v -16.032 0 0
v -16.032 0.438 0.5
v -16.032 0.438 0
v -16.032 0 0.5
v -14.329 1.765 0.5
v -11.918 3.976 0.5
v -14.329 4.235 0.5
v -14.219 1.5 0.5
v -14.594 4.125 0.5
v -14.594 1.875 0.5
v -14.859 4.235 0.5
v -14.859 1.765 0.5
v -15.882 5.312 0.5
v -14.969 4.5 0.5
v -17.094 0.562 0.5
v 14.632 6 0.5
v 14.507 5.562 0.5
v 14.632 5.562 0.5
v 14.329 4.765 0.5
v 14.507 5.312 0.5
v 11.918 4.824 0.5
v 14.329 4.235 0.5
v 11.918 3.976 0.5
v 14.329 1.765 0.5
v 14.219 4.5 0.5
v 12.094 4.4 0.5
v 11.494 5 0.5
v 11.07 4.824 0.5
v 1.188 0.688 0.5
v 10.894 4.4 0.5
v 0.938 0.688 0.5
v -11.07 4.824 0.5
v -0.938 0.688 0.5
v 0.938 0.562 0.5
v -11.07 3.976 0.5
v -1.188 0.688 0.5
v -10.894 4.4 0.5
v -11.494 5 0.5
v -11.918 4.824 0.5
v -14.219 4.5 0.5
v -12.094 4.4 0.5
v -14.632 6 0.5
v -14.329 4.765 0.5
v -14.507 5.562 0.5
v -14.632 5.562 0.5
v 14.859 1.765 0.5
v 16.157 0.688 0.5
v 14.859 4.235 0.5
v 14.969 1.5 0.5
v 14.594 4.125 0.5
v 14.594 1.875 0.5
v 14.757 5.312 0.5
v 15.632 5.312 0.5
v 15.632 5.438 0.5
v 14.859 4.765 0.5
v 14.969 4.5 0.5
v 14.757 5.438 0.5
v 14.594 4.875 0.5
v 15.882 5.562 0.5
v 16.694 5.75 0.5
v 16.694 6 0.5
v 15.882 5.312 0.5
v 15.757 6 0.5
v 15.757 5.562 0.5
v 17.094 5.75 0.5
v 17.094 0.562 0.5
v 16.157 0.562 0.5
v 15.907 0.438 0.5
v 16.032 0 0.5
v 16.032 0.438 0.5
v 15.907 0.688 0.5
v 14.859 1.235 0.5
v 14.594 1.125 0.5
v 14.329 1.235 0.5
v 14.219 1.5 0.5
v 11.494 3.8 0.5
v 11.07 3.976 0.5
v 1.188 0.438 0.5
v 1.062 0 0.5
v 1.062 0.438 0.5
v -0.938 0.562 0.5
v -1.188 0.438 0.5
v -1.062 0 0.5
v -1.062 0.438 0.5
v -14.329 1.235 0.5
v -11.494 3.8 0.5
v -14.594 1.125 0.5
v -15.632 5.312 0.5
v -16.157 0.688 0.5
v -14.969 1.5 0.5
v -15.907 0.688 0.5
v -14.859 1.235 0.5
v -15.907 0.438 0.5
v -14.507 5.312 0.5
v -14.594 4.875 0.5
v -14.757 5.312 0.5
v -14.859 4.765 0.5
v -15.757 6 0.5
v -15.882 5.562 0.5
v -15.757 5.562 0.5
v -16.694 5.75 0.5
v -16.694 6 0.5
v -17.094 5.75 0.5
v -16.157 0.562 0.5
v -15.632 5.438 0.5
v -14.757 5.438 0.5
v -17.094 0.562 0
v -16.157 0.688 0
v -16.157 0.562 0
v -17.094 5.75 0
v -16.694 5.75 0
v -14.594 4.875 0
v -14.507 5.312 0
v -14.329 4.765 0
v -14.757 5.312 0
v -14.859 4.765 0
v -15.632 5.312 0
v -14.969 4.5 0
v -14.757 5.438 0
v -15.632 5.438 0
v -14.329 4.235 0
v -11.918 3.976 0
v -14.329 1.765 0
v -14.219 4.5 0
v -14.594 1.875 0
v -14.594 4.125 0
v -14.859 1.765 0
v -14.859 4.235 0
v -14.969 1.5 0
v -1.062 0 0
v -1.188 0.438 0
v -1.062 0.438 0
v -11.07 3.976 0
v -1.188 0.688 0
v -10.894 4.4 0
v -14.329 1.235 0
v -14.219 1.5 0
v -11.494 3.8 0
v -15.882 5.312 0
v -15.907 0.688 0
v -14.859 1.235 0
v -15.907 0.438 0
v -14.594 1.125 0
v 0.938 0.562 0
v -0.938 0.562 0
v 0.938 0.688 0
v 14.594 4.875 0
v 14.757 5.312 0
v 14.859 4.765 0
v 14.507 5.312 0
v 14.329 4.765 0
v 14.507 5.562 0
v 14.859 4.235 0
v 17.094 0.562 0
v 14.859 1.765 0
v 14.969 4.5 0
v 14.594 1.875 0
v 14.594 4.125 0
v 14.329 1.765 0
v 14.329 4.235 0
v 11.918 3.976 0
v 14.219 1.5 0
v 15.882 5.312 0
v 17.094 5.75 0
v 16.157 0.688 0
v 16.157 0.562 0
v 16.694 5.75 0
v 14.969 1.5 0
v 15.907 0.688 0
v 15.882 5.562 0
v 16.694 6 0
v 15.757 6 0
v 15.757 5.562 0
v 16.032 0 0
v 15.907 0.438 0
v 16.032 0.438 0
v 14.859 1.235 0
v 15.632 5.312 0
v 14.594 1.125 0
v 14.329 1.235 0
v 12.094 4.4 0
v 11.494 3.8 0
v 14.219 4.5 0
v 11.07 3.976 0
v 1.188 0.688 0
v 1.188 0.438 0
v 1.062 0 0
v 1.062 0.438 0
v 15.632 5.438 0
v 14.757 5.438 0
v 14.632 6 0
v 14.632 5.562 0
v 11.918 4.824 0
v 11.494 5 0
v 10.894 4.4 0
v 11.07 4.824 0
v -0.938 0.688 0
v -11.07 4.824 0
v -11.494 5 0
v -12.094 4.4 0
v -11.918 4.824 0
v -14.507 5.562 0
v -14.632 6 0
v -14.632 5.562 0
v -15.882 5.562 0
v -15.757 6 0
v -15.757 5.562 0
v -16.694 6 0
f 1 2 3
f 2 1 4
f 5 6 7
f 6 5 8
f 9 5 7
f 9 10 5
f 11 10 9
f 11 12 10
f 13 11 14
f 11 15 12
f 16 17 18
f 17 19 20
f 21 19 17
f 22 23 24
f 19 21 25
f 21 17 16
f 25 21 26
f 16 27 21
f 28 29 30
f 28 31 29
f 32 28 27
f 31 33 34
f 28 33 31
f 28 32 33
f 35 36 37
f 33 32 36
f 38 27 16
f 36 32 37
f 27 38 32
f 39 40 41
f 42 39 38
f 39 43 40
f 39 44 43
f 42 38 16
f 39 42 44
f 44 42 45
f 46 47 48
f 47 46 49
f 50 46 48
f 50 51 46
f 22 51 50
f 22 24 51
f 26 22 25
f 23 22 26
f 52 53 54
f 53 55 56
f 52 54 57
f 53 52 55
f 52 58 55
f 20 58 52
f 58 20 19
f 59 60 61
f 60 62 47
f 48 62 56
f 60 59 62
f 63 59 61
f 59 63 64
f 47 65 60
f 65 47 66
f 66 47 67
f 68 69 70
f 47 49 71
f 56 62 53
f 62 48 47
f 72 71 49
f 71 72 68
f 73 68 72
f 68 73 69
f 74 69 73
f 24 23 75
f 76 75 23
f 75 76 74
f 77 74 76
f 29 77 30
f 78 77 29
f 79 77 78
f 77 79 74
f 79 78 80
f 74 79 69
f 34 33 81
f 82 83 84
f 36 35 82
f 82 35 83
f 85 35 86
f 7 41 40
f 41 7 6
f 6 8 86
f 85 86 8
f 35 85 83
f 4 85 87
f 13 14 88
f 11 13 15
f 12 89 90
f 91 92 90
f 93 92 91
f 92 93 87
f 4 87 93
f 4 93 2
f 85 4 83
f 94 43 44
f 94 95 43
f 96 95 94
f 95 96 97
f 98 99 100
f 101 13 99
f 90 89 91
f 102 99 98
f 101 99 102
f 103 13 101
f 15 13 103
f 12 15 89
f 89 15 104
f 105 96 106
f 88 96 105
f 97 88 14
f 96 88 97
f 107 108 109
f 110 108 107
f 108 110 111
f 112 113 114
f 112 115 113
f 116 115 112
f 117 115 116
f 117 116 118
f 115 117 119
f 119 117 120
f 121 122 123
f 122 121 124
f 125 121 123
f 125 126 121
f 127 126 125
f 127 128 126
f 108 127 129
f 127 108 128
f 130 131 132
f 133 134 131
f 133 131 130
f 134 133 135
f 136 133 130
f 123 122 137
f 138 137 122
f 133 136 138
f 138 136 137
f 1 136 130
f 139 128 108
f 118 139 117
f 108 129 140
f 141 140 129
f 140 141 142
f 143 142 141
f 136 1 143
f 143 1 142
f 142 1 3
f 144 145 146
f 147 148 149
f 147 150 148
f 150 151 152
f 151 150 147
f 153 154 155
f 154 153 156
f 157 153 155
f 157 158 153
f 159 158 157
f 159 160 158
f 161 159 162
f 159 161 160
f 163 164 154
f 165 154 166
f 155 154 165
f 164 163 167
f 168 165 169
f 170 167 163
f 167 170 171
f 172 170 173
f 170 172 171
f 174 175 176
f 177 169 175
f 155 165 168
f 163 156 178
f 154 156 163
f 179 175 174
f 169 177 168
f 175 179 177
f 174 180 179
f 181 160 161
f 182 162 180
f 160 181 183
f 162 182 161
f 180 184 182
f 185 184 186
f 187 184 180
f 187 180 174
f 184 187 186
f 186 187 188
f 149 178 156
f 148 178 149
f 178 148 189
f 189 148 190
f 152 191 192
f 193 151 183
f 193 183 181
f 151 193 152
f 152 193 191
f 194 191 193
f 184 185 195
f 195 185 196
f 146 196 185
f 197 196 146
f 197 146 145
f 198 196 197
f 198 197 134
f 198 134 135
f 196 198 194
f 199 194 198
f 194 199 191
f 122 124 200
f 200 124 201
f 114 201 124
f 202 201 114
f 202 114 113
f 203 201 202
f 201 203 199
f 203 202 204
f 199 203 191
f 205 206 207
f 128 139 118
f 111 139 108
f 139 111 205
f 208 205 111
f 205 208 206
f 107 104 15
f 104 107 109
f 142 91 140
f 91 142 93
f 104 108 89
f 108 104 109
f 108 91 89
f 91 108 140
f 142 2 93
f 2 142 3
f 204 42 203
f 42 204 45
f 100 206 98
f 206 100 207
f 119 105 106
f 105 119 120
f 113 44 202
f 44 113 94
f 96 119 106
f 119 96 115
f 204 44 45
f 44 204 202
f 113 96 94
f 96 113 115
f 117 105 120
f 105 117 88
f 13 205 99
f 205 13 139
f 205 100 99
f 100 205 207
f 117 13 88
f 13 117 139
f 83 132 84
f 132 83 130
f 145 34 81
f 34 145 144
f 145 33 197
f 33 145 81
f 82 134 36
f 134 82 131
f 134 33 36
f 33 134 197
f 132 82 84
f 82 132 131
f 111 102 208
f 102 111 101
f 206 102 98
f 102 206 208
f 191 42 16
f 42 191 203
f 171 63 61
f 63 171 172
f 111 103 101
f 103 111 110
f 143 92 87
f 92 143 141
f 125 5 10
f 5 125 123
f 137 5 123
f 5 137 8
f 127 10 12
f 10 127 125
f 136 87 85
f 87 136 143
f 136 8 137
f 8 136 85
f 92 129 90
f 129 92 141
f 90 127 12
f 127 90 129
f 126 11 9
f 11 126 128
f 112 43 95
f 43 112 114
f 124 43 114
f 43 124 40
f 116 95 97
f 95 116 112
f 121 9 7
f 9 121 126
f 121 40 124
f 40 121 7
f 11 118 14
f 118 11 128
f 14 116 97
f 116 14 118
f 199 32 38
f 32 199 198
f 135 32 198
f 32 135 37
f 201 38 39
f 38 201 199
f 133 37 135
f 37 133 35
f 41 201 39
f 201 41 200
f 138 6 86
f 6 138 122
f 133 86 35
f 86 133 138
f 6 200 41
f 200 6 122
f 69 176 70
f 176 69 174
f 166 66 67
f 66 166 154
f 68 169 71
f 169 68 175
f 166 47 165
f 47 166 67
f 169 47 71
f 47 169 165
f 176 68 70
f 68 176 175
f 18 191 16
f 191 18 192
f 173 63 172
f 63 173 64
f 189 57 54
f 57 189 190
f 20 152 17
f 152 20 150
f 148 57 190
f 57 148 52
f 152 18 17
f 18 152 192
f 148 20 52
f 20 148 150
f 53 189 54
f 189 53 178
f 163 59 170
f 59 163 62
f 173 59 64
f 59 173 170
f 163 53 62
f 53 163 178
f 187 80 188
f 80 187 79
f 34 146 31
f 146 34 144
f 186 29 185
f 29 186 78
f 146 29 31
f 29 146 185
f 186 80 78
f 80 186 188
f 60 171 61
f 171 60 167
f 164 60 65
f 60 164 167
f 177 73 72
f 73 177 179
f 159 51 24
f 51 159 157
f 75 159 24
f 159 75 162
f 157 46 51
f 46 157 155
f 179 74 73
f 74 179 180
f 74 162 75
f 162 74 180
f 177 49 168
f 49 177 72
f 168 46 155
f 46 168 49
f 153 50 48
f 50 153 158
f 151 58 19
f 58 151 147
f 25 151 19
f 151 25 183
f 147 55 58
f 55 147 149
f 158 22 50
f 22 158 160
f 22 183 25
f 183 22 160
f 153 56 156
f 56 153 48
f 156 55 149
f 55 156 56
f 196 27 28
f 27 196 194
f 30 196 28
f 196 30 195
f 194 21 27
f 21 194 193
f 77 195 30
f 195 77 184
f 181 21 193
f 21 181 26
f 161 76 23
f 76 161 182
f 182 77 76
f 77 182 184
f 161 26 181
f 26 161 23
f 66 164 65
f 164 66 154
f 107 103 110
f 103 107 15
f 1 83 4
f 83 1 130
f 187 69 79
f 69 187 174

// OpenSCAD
// file: modus.scad
//Corner Joint - allows the sides of two parts to create inlayed corner. Aids with welding.
//need to verify module math is the same throughout all parts.

module cornerjoint(Z,L,H,EndGap,PadL,PadH,CJangle,CJcenter){
    //change so that H = Z of inlayed part (usually 0.5)
    //add center and angle in degrees option, orgin far side of cut out area

     if((CJangle==0)&&(CJcenter==0))
      {    
        translate([0,0,0])
        rotate([0,0,CJangle])
        difference(){
        cube([L,H+PadH,Z]);
        translate([EndGap,H,0])
        cube([PadL,PadH,Z]);
        translate([L-EndGap-PadL,H,0])
        cube([PadL,PadH,Z]);}
      }    
else if((CJangle==90)&&(CJcenter==0))
      {    
        translate([H+PadH,0,0])
        rotate([0,0,CJangle])
        difference(){
        cube([L,H+PadH,Z]);
        translate([EndGap,H,0])
        cube([PadL,PadH,Z]);
        translate([L-EndGap-PadL,H,0])
        cube([PadL,PadH,Z]);}
      }
else if((CJangle==180)&&(CJcenter==0))       
      {    
        translate([L,H+PadH,0])
        rotate([0,0,CJangle])
        difference(){
        cube([L,H+PadH,Z]);
        translate([EndGap,H,0])
        cube([PadL,PadH,Z]);
        translate([L-EndGap-PadL,H,0])
        cube([PadL,PadH,Z]);}
      }
else if((CJangle==270)&&(CJcenter==0))
      {    
        translate([0,L,0])
        rotate([0,0,CJangle])
        difference(){
        cube([L,H+PadH,Z]);
        translate([EndGap,H,0])
        cube([PadL,PadH,Z]);
        translate([L-EndGap-PadL,H,0])
        cube([PadL,PadH,Z]);}
      }  
      
//centered     
   
else if((CJangle==0)&&(CJcenter==1))
      {    
        translate([-L/2,0,0])
        rotate([0,0,CJangle])
        difference(){
        cube([L,H+PadH,Z]);
        translate([EndGap,H,0])
        cube([PadL,PadH,Z]);
        translate([L-EndGap-PadL,H,0])
        cube([PadL,PadH,Z]);}
      }  
else if((CJangle==90)&&(CJcenter==1))
      {    
        translate([0,-L/2,0])
        rotate([0,0,CJangle])
        difference(){
        cube([L,H+PadH,Z]);
        translate([EndGap,H,0])
        cube([PadL,PadH,Z]);
        translate([L-EndGap-PadL,H,0])
        cube([PadL,PadH,Z]);}
      }
else if((CJangle==180)&&(CJcenter==1))       
      {    
        translate([L/2,0,0])
        rotate([0,0,CJangle])
        difference(){
        cube([L,H+PadH,Z]);
        translate([EndGap,H,0])
        cube([PadL,PadH,Z]);
        translate([L-EndGap-PadL,H,0])
        cube([PadL,PadH,Z]);}
      }
else if((CJangle==270)&&(CJcenter==1))
      {    
        translate([0,L/2,0])
        rotate([0,0,CJangle])
        difference(){
        cube([L,H+PadH,Z]);
        translate([EndGap,H,0])
        cube([PadL,PadH,Z]);
        translate([L-EndGap-PadL,H,0])
        cube([PadL,PadH,Z]);}
      }
} //end cornerjoint module

//Tab Insert - used to cut a hole for an abutting part to insert into. Typically aids with welding the two parts.
module tabinsert(X,Y,Z,dGap,cGap,c1,c2,c3,c4,c5,c6,c7,c8,center){
    translate([-dGap-(center*(X/2)),-dGap-(center*(Y/2)),0]){
        //main cut
        cube([X+(dGap*2),Y+(dGap*2),Z]);
        //corner c1c2
        translate([-cGap,(Y+(dGap*2))-c1+cGap,0])
            {
        cube([c2,c1,Z]);}
       //corner c3c4
       translate([(X+(dGap*2))-c3+cGap,(Y+(dGap*2))-c4+cGap,0]){
           cube([c3,c4,Z]);
       }
       //corner c5c6
       translate([(X+(dGap*2))-c6+cGap,-cGap,0])
      {
          cube([c6,c5,Z]);
      }
       
       //corner c7c8 
       translate([-cGap,-cGap,0]){
           cube([c7,c8,Z]);
       }
    
    } //end center translate
} //end tabinsert module
 

module nut(flattoflat,nutheight){  //distance from one flat side to the other flat side "A/F"

//typical sizes found here:
//https://en.wikipedia.org/wiki/Nut_(hardware)

difference(){
    translate([0,0,nutheight/2])
cube(size = [10,10,nutheight], center = true);
    
for(i=[1:6]){
    rotate([0,0,i*60])
difference(){
    translate([-10,0,0])
    cube([20,20,nutheight]);
    translate([-10,0,0])
    cube([20,flattoflat/2,nutheight]);
}  //end difference
}  //end for
}  //end differeence
}  //end module
// file: vars.scad
brickW=6; 
brickL=24;
brickCH=6; //Is brick height being shortened by d1z??

//3.625 x 2.25 x 8
//6 x 12 x 6

grateX=56;
grateY=23;
grateH=37; //Height mounted above press's frame
grateA=17.5; //angle of grate

//grateX=56;
//grateY=23;
//grateH=37; //Height mounted above press's frame
//grateA=17.5; //angle of grate


$fn=8; //defines resolution of circles. 8 is okay for review. 100  or greater should be used for for final dxf export.

dZstandard=0.5; //thickness of steel to be cut for drawer parts
fZstandard=0.5;
aZstandard=0.5; //thickness of steel to be cut for arm parts
hZstandard=0.125;

fBOLTHOLEstandardD=1; //standard bolts used on frame
aBOLTHOLEstandardD=1;

sliderodholeOD=1.2; 
d1bushingOD=1.25;
d1bushingL=1.25;
d1shaftOD=1;
d1bolt1OD=1;
d1bolt2OD=0.75;
d1nut2AF=1.25;
d1nut2H=0.665;


dGap=0.03125; //gap between a hole cut's edge and the part sitting within the hole. //D3 appears to use 0.3125, is this in error?

//all parts set to standard thickness below
//off standard preferences can be defined below

//drawer
drawergap=0.0283;  //extra room for drawer to slide in the space between f1 and f4
drawerHgap=0.1884;  //total extra space from drawer sides to frame walls. sum of both sides.

d2clevispinaccessholeOD=3;

d1z=dZstandard;
d2z=dZstandard;
d3z=dZstandard;
d4z=dZstandard;
d5z=dZstandard;
d6z=dZstandard;
d5z=dZstandard;
d7z=dZstandard;
d8z=dZstandard;
d9z=dZstandard;

d11z=dZstandard;
d12z=dZstandard;


//frame

f1y=6;
f1z=fZstandard;


f2y=3.5;
f2z=fZstandard;

f3y=3.5;
f3z=fZstandard;

f4y=11;
f4z=fZstandard;

f5y=3.5;
f5z=fZstandard;

f6y=8;
f6z=fZstandard;

f8y=brickW;
f8z=fZstandard;
f8boltD=1;

f9y=4.5;

f9z=fZstandard;




f12z=fZstandard;   

f11x=1.25;
f11z=fZstandard;

f13z=fZstandard;

f14y=3.5;
f14z=fZstandard;

//arms

a1x=4;
a1z=aZstandard;
a1out=24; //length from frame to A5 edge for bricks to sit on as they exit

a2x=6;
a2z=aZstandard;

a3x=4;
a3y=72;
a3z=aZstandard;

a4x=6;
a4y=72;
a4z=aZstandard;

a5x=6;
a5y=72;
a5z=aZstandard;

a6z=aZstandard;

//guards

h1x=grateX;
h1y=grateH;  //might need to tweak for grate thickness

h1z=hZstandard;
h2z=hZstandard;
h3z=hZstandard;
h4z=hZstandard;
h5z=hZstandard;
h6z=hZstandard;
h7z=hZstandard;
h8z=hZstandard;

//
//Input your main cylinder's dimenions here
//
cylMainBore = 5;
cylMainStroke = 16;
cylMainExt = 43;
cylMainRet = 27;
cylMainA = (cylMainRet-cylMainStroke); //center to center minus stroke length
cylMainB = 0.25; // cylinder wall thickness
cylMainD = 2.5; //Rod OD
cylMainE = 5.75; //rear pin holder width
cylMainG = 4; //rod pin holder width
cylMainJ = 3.8; //distance from the end of the cylinder body to rod pin center
cylMainR = 1.52; //pin hole ID
cylMainS = 2.5; //pin holder OD

//
//Input your drawer cylinder's dimenions here
//
//
cylDrawerBore = 5;
cylDrawerStroke = 16;
cylDrawerExt = 43;
cylDrawerRet = 27;
cylDrawerA = (cylMainRet-cylMainStroke); //center to center minus stroke length
cylDrawerB = 0.25; // cylinder wall thickness
cylDrawerD = 2.5; //Rod OD
cylDrawerE = 5.75; //rear pin holder width
cylDrawerG = 4; //rod pin holder width
cylDrawerJ = 3.8; //distance from the end of the cylinder body to rod pin center
cylDrawerR = 1.52; //pin hole ID
cylDrawerS = 2.5; //pin holder OD

cylinderDRAWERbodyH=3; //measured when in position, largest length from top to bottom of cylinder
cylinderDRAWERminC2C=0; //drawer's hydraulic cylinder's distance from the center of one mounting hole to the center of the other when fully compressed.
cylinderDRAWERmaxC2C=0; ///drawer's hydraulic cylinder's distance from the center of one mounting hole to the center of the other when fully extended.
cylinderDRAWERrodclevisW=2.5; //width of cylinders' clevis on end of rod
cylinderDRAWERrodclevisID=1;
cylinderDRAWERrodclevisOD=2;
cylinderDRAWERrearclevisW=2.5; //width of mounting clevis cylinder body
cylinderDRAWERrearclevisID=1;
cylinderDRAWERrearclevisOD=2;
cylinderDRAWERrearclevisClearance=3; //usable space around rear clevis pin (in diameter). be aware of hyraulic fittings.

//the following variables are calculated in order of dependence on preceding variables

d3x=brickL+(d2z*2);
d3y=brickCH-d1z;
d4x=brickW+d3z+d3z;
d4y=brickCH-d1z;
d5x=brickL+(d2z*2);
d5y=brickW;
d6x=brickL+(d2z*2);
d6y=brickCH;
d7x=cylinderDRAWERrearclevisClearance;
d7y=a4z+d8z+cylinderDRAWERbodyH;
d9x=cylinderDRAWERbodyH+d6z; //should be based on clevis size?
d9y=cylinderDRAWERbodyH+d8z;
d8x=brickL+(d2z*2);
d8y=max(5,(d9x-d6z));   //need to review fundamentals, 5 minimun unless d9 gets larger than d8
d11x=1.5+(d1bolt1OD*2)+d1bushingOD;
d11y=max((0.5+d1bushingL),4);

d12x=d8x;
d12y=d11y+1;

f1x=((brickL+(d2z*2)+drawerHgap+(f9y*2)));
f3x=f1x;

d1x=(brickL+d2z+d2z);
//d1x=(((f1x/2)-(((brickL+(d2z*2)+drawerHgap)/2)-fZstandard-(sliderodholeOD/2)))+(d11x/2))*2;
d1y=((brickW+d3z+d3z)*3)+1;

d2x=d8y+d6z+brickW+d3z+d5y+d3z;
d2y=brickCH;



f11y=f8y;
f6x=brickL+(d2z*2)+(f9y*2)+drawerHgap;

f9x=(f2z+((cylMainS+0.125)/2)+cylMainRet-cylMainJ+1+f4y+drawergap+d2y+f1y);  //leaves 1" between top of cylinder and bottom of F4
f8x=f9x;


f2x=brickL+(d2z*2)+drawerHgap+(f9y*2)-(1.4*2);  //distance between large cut outs in f9

f5x=brickL+(d2z*2)+drawerHgap+(f9y*2)+(a1x*2); //distance between outer edges of each A1

f4x=f5x-0.5;   //same as f5 but minus 0.25 on each side to give a little overhang

f14x=brickL+(1*2)+(.125*2)+(dGap*2); 

f12x=f3x;
f12y=(f3y*2)+brickW;

sliderodoffset=(((brickL+(d2z*2)+drawerHgap)/2)-fZstandard-(sliderodholeOD/2));

distancetof8center=(cylDrawerExt+(a4x/2)+((d9x-d6z)/2)+d6z+(brickW/2)); //F8 center on A1

a1y=distancetof8center+(brickW/2)+a1out;
a2y=a1y;

h7x=f5x-((a1x/2)*2)+(1.5*2);
h7y=cylDrawerStroke;

h8x=f5x-((a1x/2)*2)+(1.5*2);
h8y=a1out-a5x-f5y;  //distance between a5 and f5

hopperBaseX=brickL;
hopperBaseY=brickW;

h2x=grateX;
h2y=sqrt(((h1y-(sin(grateA)*grateY))*(h1y-(sin(grateA)*grateY)))+(((cos(grateA)*grateY)-hopperBaseY)*((cos(grateA)*grateY)-hopperBaseY)));

//h1y-(sin(grateA)*grateY)
//(cos(grateA)*grateY)-hopperBaseY

echo(h1y-(sin(grateA)*grateY));
echo((cos(grateA)*grateY)-hopperBaseY);
echo(h2y);
echo(atan((h1y-(sin(grateA)*grateY))/((cos(grateA)*grateY)-hopperBaseY)));
echo((h1y-(sin(grateA)*grateY))/(h1y));

// ECHO - REQUIRED PARTS BASED ON INPUTS

echo(str("Minimum drawer cylinder stroke length: ",(d3z*2)+d5y+brickW));
//would be cool to validate and confirm user inputed stroke length. set error=1; if drawer cylinder is not long enough. print an echo warning.

echo(str("Grate hieght above ground level: ",(1)));
// main file
include <vars.scad>;
use <modus.scad>;

f1p();

module f1p(){
    
difference(){
translate([-(f1x/2),0,0])
cube([f1x,f1y,f1z]);
translate([-(f1x/2),0,0])
cuts();
translate([(f1x/2),0,0])
mirror([1,0,0])
cuts();
} //end difference
module cuts(){
    tabinsert(1,f3z,f1z,0.0625,0.125,0,0,0.25,0.25,0.0,0,0,0,0);
    
    translate([0,f1y-0.25,0])
        cube([0.4,0.25,f1z]);     //appears to be intended to interface with A2, but not sure why
    translate([(f1x-f2x)/2,f1y-f2z,0])
        tabinsert(1,f2z,f1z,0.0625,0.125,0,0,0,0,0.25,0.25,0.25,0.25,0);    //f2
    translate([(f1x/2)-1,0,0])
        tabinsert(1,f3z,f1z,0.0625,0.125,0.25,0.25,0,0,0.0,0,0,0,0); 
    translate([((f1x-d3x-drawerHgap)/2)-2,1.5,0])  //bolt center to inner edge of f9=2
        cylinder(h = f1z, r = 0.375);   
    translate([((f1x-d3x-drawerHgap)/2)-2,4.5,0])
        cylinder(h = f1z, r = 0.375);
    translate([(f1x/2)-(((brickL+(d2z*2)+drawerHgap)/2)-fZstandard-(sliderodholeOD/2)),f1y-(d2z+0.5+(sliderodholeOD/2)),0]) //slider rod
        cylinder(h = f1z, r = sliderodholeOD/2);     
} //end cuts module

} //end f1p module
